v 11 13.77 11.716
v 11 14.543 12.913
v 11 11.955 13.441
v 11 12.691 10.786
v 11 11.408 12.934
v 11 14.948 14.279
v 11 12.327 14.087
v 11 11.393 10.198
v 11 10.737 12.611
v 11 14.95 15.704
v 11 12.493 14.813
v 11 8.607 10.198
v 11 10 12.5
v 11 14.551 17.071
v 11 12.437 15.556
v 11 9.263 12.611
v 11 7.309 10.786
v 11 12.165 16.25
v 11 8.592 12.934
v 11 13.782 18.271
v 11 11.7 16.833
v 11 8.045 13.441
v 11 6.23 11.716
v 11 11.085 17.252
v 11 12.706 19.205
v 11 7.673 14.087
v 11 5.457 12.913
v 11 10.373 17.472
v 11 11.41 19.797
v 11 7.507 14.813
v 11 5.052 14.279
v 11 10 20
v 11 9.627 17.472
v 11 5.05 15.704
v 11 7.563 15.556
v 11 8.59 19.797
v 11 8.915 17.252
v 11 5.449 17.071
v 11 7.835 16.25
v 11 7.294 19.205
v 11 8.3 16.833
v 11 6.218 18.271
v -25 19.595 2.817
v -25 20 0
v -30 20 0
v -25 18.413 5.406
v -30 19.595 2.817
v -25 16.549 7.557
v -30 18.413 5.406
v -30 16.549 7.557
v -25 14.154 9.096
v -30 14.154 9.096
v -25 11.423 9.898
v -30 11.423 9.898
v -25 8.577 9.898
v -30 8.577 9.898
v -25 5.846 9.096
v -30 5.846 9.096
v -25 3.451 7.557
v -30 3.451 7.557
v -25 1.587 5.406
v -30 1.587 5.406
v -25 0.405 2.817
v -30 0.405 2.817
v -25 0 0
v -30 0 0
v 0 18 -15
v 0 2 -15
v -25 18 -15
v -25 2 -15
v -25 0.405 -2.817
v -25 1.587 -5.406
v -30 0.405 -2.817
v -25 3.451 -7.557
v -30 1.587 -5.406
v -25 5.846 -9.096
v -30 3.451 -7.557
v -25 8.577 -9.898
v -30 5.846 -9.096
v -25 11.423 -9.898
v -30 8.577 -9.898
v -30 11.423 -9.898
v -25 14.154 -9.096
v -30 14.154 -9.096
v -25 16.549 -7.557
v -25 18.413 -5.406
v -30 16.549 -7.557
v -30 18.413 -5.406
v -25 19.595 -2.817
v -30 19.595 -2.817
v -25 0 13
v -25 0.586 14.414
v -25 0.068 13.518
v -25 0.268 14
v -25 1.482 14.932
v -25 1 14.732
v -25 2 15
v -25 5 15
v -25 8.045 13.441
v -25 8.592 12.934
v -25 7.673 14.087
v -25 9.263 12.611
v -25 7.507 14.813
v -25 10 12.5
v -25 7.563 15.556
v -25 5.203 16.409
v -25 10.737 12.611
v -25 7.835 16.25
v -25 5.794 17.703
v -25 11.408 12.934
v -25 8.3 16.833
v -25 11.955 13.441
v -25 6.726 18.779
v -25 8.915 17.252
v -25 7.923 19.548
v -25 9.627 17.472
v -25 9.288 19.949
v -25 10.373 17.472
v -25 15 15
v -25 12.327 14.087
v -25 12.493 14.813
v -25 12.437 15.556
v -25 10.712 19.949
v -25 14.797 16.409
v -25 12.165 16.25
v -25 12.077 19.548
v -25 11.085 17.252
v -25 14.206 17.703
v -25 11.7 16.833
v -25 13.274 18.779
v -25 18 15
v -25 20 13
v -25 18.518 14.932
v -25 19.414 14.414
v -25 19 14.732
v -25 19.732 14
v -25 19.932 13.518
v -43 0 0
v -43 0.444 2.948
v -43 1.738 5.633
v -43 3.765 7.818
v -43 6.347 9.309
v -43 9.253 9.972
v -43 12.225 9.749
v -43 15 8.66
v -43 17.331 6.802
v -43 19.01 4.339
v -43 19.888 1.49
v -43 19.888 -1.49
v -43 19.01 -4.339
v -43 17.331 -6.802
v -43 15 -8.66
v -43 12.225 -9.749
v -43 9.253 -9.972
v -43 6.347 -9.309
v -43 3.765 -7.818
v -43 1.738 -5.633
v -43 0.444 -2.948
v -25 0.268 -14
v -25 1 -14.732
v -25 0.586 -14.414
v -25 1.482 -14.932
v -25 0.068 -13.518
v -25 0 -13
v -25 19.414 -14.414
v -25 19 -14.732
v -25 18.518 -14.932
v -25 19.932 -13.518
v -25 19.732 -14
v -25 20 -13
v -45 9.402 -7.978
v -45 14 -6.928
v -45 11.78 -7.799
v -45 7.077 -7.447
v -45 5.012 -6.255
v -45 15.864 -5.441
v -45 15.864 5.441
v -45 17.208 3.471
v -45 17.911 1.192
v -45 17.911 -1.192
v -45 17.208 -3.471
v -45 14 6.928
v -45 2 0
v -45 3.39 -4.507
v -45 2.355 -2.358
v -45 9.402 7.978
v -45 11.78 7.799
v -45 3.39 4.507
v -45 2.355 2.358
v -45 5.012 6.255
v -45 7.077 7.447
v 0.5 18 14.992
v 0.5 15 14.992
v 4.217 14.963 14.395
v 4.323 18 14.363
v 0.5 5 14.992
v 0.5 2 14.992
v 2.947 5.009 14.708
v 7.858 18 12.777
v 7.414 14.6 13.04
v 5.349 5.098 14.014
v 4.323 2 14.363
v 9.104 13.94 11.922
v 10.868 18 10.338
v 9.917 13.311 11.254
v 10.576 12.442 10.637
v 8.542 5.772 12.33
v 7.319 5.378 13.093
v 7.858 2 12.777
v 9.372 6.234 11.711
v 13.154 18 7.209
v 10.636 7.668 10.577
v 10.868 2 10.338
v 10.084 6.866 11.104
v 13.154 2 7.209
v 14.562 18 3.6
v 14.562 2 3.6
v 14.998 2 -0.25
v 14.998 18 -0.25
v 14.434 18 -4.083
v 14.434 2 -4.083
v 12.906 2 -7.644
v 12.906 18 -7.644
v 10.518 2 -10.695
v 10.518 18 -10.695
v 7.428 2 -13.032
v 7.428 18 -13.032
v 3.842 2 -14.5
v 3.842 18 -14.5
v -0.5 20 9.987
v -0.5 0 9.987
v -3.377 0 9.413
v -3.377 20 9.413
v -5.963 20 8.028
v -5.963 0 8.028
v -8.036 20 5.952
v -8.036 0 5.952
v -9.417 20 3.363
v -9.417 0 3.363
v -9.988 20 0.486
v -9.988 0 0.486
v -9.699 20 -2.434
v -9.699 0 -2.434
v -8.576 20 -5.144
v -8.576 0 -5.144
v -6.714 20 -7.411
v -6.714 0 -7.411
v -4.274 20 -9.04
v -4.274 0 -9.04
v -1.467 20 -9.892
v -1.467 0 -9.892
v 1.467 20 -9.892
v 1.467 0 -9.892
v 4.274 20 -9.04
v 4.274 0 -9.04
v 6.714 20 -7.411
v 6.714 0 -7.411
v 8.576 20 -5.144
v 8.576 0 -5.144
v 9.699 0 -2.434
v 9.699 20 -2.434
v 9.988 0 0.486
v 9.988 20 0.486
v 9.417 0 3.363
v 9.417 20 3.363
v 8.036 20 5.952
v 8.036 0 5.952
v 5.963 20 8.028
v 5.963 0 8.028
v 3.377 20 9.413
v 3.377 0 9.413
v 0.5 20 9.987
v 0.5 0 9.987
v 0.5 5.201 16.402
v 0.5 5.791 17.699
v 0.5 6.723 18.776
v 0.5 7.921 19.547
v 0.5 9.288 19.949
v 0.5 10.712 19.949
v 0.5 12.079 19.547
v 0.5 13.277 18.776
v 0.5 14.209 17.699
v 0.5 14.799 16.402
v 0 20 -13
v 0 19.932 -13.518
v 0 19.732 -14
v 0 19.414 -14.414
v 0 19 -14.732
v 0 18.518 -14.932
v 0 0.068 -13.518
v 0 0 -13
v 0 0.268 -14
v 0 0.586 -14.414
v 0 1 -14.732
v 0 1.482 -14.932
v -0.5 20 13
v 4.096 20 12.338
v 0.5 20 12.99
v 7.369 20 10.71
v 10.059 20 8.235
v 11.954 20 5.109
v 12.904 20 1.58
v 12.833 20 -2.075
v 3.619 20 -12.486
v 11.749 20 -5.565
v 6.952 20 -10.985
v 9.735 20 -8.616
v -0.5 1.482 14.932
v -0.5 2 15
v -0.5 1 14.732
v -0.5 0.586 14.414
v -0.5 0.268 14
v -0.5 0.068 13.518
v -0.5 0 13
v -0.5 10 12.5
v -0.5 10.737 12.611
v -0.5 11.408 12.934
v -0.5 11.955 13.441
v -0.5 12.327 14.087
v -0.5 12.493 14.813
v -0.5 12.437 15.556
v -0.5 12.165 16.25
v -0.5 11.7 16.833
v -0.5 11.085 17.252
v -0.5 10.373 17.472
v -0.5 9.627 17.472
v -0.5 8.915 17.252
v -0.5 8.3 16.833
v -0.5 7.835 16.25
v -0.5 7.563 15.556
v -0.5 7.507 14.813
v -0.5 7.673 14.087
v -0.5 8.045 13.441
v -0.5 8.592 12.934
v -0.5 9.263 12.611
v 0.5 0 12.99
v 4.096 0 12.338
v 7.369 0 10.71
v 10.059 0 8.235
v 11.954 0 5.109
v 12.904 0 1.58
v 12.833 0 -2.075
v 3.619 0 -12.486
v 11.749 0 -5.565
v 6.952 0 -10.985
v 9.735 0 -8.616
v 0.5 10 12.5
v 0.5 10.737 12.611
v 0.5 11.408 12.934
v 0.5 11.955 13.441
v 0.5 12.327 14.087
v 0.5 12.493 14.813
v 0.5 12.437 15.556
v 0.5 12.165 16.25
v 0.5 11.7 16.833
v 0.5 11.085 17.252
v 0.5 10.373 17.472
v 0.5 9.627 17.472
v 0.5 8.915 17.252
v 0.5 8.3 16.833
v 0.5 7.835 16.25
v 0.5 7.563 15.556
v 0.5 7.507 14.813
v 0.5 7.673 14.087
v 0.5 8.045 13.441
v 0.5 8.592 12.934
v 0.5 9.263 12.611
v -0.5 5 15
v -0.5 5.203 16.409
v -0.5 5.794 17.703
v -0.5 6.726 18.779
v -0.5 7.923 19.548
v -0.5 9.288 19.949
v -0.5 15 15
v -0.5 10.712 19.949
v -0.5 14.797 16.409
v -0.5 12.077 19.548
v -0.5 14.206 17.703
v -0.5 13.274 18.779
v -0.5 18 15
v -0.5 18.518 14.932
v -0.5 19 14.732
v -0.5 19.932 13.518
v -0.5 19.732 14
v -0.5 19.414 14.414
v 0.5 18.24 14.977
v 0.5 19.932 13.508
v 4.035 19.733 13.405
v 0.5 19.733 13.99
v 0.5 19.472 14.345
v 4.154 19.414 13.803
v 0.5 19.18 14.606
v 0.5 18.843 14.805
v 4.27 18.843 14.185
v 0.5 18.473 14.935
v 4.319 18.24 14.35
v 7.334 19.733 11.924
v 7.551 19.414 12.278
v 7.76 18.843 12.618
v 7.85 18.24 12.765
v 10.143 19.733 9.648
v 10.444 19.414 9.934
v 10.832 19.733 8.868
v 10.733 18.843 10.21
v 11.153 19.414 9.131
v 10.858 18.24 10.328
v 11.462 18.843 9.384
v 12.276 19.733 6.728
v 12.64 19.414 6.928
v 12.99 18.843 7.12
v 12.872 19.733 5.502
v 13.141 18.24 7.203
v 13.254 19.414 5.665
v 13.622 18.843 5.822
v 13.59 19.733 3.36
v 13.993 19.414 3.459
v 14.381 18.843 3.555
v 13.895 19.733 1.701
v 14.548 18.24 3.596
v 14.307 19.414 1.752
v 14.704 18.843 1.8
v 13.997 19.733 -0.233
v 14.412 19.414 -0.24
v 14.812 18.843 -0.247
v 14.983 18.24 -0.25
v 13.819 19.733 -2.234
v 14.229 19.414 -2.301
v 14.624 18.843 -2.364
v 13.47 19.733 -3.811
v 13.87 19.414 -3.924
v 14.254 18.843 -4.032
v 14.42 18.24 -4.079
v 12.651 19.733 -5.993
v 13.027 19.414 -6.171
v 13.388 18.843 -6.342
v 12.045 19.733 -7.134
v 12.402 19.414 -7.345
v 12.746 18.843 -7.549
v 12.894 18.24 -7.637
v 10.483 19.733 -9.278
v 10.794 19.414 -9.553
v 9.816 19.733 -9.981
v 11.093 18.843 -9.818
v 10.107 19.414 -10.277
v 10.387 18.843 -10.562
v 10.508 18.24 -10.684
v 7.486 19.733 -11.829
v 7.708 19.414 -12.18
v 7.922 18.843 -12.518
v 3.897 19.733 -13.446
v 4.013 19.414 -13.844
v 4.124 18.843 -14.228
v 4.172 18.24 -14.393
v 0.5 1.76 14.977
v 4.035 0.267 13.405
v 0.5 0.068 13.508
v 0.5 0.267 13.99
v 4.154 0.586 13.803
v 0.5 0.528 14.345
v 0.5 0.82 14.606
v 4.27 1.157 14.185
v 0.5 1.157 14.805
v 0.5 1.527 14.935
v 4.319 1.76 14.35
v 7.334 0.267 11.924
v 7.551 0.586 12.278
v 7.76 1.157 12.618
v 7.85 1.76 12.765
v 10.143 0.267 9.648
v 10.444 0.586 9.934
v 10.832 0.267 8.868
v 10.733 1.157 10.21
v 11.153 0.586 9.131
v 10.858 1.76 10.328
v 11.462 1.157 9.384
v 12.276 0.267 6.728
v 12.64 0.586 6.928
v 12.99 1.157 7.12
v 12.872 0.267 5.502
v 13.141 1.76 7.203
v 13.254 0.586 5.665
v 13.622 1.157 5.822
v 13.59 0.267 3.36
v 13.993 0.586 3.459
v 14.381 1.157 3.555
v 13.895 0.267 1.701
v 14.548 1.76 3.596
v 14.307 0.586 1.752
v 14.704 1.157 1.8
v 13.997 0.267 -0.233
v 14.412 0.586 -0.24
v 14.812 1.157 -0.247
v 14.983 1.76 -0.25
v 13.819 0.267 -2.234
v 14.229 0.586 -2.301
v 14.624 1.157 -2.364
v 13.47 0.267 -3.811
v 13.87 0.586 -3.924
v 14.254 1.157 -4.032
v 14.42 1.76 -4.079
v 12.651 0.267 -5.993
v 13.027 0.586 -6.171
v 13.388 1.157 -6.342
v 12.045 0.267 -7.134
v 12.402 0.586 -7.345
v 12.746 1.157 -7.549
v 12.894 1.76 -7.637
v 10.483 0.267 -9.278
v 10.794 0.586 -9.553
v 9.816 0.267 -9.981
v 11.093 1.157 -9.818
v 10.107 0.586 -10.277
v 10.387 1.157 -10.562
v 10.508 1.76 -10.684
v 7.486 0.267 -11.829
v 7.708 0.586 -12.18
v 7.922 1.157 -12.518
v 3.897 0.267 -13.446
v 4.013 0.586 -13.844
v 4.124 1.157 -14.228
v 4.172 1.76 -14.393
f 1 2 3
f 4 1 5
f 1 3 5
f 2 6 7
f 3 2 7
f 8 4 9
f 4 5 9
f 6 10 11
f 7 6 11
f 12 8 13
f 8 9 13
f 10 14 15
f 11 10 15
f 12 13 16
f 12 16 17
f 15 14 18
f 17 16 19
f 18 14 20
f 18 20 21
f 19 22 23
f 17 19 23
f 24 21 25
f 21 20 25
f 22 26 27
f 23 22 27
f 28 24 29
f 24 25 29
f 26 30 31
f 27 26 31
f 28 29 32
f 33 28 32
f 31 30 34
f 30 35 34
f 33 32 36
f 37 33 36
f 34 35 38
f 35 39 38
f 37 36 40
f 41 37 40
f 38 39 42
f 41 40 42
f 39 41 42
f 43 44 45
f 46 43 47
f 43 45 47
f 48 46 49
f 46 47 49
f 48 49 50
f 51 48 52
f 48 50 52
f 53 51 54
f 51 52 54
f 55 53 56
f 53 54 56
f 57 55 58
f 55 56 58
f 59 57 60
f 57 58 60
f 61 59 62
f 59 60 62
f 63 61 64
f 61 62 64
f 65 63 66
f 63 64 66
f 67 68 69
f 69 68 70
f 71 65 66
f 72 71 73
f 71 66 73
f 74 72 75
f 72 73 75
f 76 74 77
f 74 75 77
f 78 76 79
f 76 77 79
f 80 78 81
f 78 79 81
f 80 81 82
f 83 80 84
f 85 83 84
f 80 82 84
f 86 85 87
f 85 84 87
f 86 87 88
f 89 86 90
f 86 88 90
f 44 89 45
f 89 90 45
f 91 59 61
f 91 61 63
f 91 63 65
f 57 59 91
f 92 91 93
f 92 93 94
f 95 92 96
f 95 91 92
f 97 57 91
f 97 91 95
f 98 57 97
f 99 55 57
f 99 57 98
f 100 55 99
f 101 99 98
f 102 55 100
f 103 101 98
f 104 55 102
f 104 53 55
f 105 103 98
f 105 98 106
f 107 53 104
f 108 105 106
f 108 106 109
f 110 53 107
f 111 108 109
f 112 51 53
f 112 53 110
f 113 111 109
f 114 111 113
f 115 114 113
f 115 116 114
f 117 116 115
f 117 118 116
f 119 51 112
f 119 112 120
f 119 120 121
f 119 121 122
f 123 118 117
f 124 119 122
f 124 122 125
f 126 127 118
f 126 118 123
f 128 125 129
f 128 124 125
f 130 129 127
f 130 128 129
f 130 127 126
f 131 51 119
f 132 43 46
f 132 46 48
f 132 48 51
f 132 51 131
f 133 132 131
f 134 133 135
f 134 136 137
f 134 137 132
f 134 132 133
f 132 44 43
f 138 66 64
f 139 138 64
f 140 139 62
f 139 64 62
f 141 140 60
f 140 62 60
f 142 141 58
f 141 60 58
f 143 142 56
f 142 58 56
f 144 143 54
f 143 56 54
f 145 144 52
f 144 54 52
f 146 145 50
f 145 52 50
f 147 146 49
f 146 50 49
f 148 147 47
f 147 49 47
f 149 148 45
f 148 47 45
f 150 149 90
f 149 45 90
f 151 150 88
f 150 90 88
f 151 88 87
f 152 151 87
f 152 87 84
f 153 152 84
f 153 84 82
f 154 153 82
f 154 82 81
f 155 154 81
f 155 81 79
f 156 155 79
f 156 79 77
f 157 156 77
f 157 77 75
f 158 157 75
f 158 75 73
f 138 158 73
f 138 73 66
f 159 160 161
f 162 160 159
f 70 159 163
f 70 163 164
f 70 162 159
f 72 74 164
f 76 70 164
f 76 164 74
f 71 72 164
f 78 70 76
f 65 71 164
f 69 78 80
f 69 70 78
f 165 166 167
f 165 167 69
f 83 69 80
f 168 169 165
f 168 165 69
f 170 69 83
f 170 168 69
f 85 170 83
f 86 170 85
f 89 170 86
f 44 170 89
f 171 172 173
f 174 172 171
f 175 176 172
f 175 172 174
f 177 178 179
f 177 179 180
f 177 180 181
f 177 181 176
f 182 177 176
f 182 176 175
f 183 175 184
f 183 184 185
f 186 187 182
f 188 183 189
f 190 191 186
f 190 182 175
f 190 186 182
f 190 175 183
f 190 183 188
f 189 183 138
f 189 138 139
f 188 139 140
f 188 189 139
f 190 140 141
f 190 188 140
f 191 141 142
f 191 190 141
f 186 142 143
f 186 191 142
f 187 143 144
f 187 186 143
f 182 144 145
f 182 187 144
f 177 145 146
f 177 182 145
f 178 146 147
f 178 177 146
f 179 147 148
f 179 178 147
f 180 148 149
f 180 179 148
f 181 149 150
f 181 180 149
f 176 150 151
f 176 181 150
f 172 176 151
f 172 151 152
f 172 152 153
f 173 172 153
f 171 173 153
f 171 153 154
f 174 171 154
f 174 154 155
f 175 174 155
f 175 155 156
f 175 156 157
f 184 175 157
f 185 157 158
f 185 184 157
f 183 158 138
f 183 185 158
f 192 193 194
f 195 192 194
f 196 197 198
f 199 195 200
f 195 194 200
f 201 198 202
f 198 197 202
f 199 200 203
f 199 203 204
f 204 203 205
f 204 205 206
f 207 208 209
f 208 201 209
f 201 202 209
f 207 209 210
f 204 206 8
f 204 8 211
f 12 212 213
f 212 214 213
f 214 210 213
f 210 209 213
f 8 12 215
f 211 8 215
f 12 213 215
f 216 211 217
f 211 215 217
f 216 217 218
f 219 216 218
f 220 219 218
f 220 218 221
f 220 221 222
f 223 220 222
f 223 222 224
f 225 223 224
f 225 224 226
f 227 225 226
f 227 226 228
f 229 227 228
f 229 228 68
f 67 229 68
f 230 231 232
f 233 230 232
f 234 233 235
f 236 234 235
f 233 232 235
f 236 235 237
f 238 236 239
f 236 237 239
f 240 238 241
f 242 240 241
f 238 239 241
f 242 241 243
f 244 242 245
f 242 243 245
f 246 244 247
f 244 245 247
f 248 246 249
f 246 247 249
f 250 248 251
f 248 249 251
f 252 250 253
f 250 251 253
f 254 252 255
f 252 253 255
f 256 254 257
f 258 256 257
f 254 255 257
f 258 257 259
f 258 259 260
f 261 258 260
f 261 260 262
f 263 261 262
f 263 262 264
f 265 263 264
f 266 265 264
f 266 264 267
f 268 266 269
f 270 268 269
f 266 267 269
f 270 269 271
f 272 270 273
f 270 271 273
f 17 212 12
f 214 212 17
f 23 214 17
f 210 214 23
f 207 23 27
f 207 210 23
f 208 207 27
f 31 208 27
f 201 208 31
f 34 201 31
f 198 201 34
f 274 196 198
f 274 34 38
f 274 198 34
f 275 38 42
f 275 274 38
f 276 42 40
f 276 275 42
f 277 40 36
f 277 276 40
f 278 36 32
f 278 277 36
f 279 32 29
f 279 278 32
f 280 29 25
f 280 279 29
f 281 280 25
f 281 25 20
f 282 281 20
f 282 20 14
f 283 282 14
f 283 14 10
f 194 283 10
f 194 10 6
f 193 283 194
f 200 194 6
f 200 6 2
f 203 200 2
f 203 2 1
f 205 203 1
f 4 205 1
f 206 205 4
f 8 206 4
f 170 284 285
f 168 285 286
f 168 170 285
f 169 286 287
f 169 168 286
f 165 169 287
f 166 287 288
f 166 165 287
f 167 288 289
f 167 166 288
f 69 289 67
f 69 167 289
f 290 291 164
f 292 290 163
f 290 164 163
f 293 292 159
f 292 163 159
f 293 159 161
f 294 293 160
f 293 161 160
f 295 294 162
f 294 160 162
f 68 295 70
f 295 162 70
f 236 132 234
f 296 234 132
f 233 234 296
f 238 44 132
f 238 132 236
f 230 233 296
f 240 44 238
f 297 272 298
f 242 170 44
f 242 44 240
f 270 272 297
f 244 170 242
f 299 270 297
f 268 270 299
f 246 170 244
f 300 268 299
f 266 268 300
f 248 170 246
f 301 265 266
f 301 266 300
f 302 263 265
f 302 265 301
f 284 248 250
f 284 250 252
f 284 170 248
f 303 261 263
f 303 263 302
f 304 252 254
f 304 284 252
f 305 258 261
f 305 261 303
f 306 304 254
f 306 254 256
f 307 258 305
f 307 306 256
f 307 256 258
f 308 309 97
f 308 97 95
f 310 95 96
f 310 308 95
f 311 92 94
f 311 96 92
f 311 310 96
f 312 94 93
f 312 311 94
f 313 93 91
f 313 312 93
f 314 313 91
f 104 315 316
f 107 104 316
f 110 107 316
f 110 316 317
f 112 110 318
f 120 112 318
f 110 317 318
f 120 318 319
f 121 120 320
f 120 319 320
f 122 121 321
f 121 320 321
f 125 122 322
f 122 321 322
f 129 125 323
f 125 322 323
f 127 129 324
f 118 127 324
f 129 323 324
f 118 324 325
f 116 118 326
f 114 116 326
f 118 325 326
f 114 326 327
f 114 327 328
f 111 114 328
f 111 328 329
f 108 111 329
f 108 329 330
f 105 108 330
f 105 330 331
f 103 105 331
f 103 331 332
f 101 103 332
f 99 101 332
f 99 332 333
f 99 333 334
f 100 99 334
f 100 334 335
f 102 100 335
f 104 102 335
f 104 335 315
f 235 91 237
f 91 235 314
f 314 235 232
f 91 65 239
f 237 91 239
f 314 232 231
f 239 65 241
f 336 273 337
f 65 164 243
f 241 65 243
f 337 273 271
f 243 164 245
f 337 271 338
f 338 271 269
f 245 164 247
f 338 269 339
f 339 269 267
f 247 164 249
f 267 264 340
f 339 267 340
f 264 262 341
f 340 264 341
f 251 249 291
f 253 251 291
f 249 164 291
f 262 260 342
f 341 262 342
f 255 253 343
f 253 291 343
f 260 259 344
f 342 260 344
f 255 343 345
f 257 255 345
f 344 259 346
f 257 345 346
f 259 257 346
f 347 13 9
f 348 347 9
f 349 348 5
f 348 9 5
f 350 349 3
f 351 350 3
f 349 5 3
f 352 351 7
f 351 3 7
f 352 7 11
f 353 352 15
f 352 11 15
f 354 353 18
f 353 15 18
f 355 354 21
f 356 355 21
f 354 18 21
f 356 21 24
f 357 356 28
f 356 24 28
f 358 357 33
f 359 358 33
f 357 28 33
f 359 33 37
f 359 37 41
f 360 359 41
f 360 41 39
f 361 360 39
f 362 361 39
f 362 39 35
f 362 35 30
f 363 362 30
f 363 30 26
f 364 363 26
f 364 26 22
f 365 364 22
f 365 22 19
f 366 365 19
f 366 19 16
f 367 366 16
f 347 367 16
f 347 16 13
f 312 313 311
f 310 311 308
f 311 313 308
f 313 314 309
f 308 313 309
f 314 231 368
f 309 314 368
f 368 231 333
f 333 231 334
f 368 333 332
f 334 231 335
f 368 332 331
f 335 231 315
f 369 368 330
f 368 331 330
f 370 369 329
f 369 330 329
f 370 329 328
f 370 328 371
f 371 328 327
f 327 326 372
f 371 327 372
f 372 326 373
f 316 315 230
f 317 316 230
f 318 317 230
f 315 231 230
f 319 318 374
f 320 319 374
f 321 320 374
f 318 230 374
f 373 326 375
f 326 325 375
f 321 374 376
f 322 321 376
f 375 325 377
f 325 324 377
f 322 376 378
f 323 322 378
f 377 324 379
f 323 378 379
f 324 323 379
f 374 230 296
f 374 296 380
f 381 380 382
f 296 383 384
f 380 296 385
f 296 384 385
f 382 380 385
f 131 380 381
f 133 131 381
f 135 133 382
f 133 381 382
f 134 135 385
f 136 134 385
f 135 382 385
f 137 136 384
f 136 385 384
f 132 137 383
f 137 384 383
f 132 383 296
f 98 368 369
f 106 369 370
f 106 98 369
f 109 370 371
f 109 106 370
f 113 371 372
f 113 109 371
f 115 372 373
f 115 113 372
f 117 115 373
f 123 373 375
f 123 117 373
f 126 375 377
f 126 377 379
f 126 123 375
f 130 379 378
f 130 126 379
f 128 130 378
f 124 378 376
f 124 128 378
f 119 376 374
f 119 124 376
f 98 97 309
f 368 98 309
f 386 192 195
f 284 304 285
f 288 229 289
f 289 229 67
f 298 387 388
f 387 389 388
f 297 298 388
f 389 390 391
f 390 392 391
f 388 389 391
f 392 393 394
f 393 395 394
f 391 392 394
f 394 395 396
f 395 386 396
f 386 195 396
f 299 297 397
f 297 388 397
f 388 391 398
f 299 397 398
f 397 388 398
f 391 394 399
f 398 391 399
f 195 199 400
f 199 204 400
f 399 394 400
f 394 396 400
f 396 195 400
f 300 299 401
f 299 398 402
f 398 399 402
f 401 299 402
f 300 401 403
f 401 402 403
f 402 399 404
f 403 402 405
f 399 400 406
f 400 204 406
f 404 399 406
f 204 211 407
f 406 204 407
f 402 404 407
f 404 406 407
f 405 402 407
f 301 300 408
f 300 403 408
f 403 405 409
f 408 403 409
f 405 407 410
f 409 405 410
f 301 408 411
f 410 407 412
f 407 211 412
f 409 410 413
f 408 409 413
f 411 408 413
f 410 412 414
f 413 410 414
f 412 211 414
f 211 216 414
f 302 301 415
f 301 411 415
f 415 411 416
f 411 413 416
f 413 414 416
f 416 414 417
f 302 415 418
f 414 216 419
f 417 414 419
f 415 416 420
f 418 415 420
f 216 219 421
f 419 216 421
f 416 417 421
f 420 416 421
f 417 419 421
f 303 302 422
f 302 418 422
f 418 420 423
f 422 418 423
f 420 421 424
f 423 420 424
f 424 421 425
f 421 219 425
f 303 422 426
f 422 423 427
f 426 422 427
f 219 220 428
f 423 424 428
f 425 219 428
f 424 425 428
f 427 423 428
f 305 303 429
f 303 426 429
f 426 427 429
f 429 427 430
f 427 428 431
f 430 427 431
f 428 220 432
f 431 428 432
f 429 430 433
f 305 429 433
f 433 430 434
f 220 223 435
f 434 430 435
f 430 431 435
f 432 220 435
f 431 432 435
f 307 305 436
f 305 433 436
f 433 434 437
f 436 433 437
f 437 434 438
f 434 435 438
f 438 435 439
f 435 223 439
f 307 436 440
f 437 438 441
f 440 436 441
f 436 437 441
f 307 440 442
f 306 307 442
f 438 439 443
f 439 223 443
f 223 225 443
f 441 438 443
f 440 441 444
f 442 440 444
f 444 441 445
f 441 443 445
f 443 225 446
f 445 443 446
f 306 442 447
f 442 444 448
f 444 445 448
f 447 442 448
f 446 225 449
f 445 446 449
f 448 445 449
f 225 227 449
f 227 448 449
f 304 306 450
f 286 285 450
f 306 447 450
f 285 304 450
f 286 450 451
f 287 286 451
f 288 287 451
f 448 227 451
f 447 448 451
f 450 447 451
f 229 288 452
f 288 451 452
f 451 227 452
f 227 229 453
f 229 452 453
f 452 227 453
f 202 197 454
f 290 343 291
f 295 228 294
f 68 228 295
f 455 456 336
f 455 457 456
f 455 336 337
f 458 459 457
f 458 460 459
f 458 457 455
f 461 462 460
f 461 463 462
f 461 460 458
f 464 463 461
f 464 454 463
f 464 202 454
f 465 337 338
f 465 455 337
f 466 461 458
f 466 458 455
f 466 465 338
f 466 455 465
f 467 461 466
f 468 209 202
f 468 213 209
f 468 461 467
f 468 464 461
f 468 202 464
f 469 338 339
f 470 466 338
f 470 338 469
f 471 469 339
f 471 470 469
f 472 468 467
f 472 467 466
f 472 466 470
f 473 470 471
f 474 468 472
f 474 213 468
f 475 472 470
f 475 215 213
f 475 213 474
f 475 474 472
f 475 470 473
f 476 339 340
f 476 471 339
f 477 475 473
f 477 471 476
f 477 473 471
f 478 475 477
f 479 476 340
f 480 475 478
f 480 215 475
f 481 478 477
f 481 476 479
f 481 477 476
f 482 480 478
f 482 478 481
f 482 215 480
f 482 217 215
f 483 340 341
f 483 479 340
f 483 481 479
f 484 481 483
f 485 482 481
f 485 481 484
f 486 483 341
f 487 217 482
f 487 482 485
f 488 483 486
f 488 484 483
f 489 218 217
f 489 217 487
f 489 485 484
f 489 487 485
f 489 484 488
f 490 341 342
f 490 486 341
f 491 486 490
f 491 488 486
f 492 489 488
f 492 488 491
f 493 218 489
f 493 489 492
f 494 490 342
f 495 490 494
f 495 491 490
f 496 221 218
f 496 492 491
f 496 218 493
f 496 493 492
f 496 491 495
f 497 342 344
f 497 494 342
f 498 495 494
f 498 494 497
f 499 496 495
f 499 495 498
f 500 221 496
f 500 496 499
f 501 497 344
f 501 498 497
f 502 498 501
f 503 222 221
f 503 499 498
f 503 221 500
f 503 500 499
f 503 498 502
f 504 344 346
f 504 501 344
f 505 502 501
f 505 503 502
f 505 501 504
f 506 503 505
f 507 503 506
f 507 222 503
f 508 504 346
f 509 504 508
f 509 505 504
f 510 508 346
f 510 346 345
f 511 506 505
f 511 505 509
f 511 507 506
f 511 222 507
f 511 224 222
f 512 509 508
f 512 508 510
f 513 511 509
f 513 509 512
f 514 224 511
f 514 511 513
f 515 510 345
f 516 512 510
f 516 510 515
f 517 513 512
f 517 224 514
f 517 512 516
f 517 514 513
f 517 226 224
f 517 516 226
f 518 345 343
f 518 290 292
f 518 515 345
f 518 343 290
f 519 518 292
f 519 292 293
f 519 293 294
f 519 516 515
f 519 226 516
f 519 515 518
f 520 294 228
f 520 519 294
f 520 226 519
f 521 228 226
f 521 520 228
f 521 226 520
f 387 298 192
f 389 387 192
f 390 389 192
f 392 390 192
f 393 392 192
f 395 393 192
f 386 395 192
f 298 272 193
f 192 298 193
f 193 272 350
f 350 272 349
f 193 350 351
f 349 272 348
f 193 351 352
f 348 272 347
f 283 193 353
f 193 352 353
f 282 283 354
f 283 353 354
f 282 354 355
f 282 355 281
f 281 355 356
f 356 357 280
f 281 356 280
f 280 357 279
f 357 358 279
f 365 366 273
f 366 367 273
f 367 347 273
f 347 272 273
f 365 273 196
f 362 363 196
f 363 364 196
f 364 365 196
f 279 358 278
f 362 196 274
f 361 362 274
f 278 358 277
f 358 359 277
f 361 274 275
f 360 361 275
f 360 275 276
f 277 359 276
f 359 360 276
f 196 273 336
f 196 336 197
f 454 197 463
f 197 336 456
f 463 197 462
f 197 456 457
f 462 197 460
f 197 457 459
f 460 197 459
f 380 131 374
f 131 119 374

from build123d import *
from build123d.topology import SkipClean

# Parameters (mm, degrees)
BOSS_EXTRUDE1_DEPTH = 20
SKETCH2_R           = 5
BOSS_EXTRUDE2_DEPTH = 41
CUT_EXTRUDE1_DEPTH  = 41
SKETCH4_R           = 2.5
CUT_EXTRUDE2_DEPTH  = 50.809637702
FILLET1_R           = 2
SKETCH5_R           = 10
BOSS_EXTRUDE3_DEPTH = 15
CUT_EXTRUDE3_DEPTH  = 5
CHAMFER1_SIZE       = 2


with BuildPart() as part:
    # Sketch1 → Boss-Extrude1 (new body)
    with BuildSketch(Plane(origin=(0, 0, 0), x_dir=(1, 0, 0), z_dir=(0, 1, 0))):
        with BuildLine():
            ThreePointArc((0.5, -14.991664351), (14.997915943, 0.250034739), (0, 15))
            Line((0, 15), (-30, 15))
            Line((-30, 15), (-30, -15))
            Line((-30, -15), (-0.5, -15))
            Line((-0.5, -15), (-0.5, -9.987492178))
            ThreePointArc((-0.5, -9.987492178), (0, 10), (0.5, -9.987492178))
            Line((0.5, -9.987492178), (0.5, -14.991664351))
        make_face()
    extrude(amount=BOSS_EXTRUDE1_DEPTH)

    # Sketch2 → Boss-Extrude2 (add)
    with BuildSketch(Plane.ZY.offset(30)):
        with Locations(Location((15, 10, 0), (0, 0, 270))):
            Circle(SKETCH2_R)
    extrude(amount=-BOSS_EXTRUDE2_DEPTH)

    # Sketch3 → Cut-Extrude1 (cut)
    with BuildSketch(Plane(origin=(0, 20, 0), x_dir=(1, 0, 0), z_dir=(0, 1, 0))):
        Polygon((-0.5, -15), (-0.5, -9.987492178), (0.5, -9.987492178), (0.5, -14.991664351), (0.5, -20), (-0.5, -20), align=None)
    extrude(amount=-CUT_EXTRUDE1_DEPTH, mode=Mode.SUBTRACT)

    # Sketch4 → Cut-Extrude2 (cut, through all)
    with BuildSketch(Plane(origin=(11, 0, 0), x_dir=(0, 0, -1), z_dir=(1, 0, 0))):
        with Locations((-15, 10)):
            Circle(SKETCH4_R)
    extrude(amount=-CUT_EXTRUDE2_DEPTH, mode=Mode.SUBTRACT)

    # Fillet1
    fillet1_edges = [part.edges().sort_by_distance(p)[0] for p in [
        (-15, 0, -15),
        (14.997915943, 0, -0.250034739),
        (-15, 20, -15),
        (-15.25, 20, 15),
        (14.997915943, 20, -0.250034739),
        (-15.25, 0, 15),
    ]]
    fillet(fillet1_edges, radius=FILLET1_R)

    # Sketch5 → Boss-Extrude3 (add)
    with BuildSketch(Plane.ZY.offset(30)):
        with Locations(Location((0, 10, 0), (0, 0, 270))):
            Circle(SKETCH5_R)
    extrude(amount=BOSS_EXTRUDE3_DEPTH)

    # Sketch6 → Cut-Extrude3 (cut)
    with SkipClean():  # the faces are left unmerged after this step: merging them gives an invalid solid
        with BuildSketch(Plane.ZY.offset(30)):
            with BuildLine():
                ThreePointArc((0, 0), (-10, 10), (0, 20))
                Line((0, 20), (-13, 20))
                ThreePointArc((-13, 20), (-14.414213562, 19.414213562), (-15, 18))
                Line((-15, 18), (-15, 2))
                ThreePointArc((-15, 2), (-14.414213562, 0.585786438), (-13, 0))
                Line((-13, 0), (0, 0))
            make_face()
            with BuildLine():
                Line((13, 20), (0, 20))
                ThreePointArc((0, 20), (10, 10), (0, 0))
                Line((0, 0), (13, 0))
                ThreePointArc((13, 0), (14.414213562, 0.585786438), (15, 2))
                Line((15, 2), (15, 5))
                ThreePointArc((15, 5), (20, 10), (15, 15))
                Line((15, 15), (15, 18))
                ThreePointArc((15, 18), (14.414213562, 19.414213562), (13, 20))
            make_face()
        extrude(amount=-CUT_EXTRUDE3_DEPTH, mode=Mode.SUBTRACT)

    # Chamfer1
    chamfer1_edges = [part.edges().sort_by_distance(p)[0] for p in [
        (-45, 20, 0),
    ]]
    chamfer(chamfer1_edges, length=CHAMFER1_SIZE)


solid = part.part
